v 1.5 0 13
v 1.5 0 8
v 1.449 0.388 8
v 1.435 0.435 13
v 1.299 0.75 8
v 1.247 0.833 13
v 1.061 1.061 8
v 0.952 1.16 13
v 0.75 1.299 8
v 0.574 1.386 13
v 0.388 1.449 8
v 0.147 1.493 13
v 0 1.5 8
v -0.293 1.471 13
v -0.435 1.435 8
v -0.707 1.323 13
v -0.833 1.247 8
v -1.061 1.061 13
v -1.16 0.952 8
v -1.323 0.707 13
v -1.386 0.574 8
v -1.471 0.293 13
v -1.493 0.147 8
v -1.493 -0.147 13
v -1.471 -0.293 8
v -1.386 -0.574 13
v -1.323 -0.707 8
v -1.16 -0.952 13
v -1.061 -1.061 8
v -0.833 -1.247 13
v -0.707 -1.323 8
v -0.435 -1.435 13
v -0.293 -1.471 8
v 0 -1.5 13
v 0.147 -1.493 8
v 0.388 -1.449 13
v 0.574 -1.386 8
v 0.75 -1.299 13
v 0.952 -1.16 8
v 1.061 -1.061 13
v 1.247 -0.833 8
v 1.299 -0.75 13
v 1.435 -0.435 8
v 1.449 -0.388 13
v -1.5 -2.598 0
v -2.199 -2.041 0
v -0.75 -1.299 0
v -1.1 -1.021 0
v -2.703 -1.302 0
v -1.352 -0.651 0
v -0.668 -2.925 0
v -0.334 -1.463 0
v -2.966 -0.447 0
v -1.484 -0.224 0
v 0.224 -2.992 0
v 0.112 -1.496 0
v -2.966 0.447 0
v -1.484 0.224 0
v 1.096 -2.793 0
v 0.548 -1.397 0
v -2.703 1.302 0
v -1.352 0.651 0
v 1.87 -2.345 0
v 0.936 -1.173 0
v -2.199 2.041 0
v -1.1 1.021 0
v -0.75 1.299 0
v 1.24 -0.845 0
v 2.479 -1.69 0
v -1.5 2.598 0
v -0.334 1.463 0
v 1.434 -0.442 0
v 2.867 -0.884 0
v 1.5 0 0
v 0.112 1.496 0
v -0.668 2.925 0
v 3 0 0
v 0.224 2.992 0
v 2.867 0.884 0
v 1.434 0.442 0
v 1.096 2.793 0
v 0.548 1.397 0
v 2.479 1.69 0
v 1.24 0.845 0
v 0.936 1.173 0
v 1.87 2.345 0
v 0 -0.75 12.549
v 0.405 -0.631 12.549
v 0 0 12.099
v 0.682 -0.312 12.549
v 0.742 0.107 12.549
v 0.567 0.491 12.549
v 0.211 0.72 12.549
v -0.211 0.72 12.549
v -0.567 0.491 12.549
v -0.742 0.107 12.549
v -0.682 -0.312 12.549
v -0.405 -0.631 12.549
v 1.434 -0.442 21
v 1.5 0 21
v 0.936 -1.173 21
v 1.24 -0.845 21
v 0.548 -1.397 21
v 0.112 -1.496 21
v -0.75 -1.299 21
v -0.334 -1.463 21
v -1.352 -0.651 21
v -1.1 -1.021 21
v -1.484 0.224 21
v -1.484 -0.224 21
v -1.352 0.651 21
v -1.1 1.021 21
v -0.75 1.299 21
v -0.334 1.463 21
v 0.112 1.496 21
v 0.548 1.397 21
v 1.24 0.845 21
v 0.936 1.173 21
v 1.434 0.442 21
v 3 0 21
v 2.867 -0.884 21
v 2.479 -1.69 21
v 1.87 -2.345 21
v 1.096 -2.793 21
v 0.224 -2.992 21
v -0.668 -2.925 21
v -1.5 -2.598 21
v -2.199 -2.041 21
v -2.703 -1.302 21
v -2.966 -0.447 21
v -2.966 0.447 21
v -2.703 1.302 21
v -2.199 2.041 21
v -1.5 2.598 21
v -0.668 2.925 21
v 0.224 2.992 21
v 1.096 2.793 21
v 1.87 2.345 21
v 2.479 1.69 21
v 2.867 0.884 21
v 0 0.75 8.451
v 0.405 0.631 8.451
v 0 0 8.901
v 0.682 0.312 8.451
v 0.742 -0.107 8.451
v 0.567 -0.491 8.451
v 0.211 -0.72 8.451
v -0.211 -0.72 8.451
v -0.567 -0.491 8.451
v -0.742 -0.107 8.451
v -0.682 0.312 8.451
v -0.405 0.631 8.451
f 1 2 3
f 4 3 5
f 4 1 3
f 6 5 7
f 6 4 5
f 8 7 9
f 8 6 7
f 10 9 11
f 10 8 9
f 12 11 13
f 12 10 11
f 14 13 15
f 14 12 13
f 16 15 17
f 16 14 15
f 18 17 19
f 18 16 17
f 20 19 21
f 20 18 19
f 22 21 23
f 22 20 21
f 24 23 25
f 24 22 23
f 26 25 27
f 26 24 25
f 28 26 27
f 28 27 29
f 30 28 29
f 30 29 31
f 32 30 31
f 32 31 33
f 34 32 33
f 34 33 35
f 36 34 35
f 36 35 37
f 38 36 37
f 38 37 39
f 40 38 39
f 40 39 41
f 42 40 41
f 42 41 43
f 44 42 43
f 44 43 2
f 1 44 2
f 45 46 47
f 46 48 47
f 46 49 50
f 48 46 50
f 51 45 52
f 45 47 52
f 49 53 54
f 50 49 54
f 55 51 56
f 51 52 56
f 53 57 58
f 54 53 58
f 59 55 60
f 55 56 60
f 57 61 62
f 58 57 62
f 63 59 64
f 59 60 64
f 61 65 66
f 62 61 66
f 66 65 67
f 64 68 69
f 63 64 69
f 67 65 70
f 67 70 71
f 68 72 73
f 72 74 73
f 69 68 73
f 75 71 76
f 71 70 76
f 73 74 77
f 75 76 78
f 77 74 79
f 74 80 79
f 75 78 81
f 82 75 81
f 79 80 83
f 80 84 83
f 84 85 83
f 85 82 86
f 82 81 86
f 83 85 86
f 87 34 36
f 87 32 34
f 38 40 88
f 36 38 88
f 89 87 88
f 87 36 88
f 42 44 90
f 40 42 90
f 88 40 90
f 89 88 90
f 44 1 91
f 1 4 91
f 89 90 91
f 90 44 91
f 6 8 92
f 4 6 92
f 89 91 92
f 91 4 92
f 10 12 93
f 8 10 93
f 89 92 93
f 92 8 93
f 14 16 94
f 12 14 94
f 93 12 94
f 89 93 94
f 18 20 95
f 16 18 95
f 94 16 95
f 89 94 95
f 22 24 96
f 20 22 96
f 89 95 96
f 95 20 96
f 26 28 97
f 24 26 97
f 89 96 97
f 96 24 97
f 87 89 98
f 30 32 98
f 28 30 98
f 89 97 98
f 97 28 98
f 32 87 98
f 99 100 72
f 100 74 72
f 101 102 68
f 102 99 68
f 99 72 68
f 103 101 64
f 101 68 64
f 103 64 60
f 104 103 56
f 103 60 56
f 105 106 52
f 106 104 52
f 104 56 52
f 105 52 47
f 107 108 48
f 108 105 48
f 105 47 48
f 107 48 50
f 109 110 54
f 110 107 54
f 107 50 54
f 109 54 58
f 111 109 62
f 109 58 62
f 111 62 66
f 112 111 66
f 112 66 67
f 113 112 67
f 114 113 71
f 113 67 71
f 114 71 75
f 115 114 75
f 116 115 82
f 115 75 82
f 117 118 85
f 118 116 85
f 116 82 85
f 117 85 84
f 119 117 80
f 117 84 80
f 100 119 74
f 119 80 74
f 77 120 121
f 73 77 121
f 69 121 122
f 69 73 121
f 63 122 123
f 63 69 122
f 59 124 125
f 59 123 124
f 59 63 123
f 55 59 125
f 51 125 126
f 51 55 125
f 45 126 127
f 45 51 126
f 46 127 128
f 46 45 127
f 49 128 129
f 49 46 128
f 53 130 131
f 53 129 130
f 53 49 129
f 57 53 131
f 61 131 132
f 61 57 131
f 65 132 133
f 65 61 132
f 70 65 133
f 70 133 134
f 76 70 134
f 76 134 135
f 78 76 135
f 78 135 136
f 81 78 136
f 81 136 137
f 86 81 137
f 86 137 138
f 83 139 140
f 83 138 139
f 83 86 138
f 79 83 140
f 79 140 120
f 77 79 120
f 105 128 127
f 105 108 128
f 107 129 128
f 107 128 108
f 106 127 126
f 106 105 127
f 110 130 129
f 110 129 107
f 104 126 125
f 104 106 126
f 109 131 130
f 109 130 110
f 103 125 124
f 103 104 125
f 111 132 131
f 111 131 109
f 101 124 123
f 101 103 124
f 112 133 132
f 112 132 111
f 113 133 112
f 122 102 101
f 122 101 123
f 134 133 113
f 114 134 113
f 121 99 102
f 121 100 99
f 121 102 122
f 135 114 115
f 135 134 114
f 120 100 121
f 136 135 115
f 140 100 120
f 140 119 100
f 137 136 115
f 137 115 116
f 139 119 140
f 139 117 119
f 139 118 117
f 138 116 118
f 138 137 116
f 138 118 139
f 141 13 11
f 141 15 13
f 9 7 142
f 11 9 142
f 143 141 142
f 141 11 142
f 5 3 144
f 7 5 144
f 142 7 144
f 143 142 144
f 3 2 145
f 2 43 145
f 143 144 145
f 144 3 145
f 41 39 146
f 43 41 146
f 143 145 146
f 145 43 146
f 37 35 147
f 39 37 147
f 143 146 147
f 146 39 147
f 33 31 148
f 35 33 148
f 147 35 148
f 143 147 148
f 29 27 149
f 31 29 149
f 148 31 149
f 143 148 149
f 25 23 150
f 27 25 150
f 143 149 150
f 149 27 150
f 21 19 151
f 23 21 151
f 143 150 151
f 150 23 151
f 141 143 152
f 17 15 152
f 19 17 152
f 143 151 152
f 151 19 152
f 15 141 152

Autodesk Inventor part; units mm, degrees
ref_plane "YZ Plane" through (0, 0, 0) normal (1, 0, 0) x (0, 1, 0)
ref_plane "XZ Plane" through (0, 0, 0) normal (0, 1, 0) x (-1, 0, 0)
ref_plane "XY Plane" through (0, 0, 0) normal (0, 0, 1) x (1, 0, 0)
sketch "スケッチ1" plane through (0, 0, 0) normal (0, 0, 1) x (1, 0, 0)
  circle A0 centre (0, 0) radius 3
  circle A1 centre (0, 0) radius 1.5005
  dimension "d0" = 6
  dimension "d1" = 3.001
extrude "押し出し1" add sketch "スケッチ1" along normal blind 21
sketch "スケッチ2" plane through (0, 0, 21) normal (0, 0, 1) x (1, 0, 0)
  circle A0 centre (0, 0) radius 1.5
  dimension "d4" = 3
extrude "押し出し2" add sketch "スケッチ2" against normal blind 21
hole "穴1" at (0, 0, 21) direction (0, 0, -1) diameter 3 depth 8 tip angle 118
hole "穴2" at (0, 0, 0) direction (0, 0, 1) diameter 3 depth 8 tip angle 118
properties part number "スペーサーm3-21　簡易筒型" material "アルミニウム 2014-T4"
